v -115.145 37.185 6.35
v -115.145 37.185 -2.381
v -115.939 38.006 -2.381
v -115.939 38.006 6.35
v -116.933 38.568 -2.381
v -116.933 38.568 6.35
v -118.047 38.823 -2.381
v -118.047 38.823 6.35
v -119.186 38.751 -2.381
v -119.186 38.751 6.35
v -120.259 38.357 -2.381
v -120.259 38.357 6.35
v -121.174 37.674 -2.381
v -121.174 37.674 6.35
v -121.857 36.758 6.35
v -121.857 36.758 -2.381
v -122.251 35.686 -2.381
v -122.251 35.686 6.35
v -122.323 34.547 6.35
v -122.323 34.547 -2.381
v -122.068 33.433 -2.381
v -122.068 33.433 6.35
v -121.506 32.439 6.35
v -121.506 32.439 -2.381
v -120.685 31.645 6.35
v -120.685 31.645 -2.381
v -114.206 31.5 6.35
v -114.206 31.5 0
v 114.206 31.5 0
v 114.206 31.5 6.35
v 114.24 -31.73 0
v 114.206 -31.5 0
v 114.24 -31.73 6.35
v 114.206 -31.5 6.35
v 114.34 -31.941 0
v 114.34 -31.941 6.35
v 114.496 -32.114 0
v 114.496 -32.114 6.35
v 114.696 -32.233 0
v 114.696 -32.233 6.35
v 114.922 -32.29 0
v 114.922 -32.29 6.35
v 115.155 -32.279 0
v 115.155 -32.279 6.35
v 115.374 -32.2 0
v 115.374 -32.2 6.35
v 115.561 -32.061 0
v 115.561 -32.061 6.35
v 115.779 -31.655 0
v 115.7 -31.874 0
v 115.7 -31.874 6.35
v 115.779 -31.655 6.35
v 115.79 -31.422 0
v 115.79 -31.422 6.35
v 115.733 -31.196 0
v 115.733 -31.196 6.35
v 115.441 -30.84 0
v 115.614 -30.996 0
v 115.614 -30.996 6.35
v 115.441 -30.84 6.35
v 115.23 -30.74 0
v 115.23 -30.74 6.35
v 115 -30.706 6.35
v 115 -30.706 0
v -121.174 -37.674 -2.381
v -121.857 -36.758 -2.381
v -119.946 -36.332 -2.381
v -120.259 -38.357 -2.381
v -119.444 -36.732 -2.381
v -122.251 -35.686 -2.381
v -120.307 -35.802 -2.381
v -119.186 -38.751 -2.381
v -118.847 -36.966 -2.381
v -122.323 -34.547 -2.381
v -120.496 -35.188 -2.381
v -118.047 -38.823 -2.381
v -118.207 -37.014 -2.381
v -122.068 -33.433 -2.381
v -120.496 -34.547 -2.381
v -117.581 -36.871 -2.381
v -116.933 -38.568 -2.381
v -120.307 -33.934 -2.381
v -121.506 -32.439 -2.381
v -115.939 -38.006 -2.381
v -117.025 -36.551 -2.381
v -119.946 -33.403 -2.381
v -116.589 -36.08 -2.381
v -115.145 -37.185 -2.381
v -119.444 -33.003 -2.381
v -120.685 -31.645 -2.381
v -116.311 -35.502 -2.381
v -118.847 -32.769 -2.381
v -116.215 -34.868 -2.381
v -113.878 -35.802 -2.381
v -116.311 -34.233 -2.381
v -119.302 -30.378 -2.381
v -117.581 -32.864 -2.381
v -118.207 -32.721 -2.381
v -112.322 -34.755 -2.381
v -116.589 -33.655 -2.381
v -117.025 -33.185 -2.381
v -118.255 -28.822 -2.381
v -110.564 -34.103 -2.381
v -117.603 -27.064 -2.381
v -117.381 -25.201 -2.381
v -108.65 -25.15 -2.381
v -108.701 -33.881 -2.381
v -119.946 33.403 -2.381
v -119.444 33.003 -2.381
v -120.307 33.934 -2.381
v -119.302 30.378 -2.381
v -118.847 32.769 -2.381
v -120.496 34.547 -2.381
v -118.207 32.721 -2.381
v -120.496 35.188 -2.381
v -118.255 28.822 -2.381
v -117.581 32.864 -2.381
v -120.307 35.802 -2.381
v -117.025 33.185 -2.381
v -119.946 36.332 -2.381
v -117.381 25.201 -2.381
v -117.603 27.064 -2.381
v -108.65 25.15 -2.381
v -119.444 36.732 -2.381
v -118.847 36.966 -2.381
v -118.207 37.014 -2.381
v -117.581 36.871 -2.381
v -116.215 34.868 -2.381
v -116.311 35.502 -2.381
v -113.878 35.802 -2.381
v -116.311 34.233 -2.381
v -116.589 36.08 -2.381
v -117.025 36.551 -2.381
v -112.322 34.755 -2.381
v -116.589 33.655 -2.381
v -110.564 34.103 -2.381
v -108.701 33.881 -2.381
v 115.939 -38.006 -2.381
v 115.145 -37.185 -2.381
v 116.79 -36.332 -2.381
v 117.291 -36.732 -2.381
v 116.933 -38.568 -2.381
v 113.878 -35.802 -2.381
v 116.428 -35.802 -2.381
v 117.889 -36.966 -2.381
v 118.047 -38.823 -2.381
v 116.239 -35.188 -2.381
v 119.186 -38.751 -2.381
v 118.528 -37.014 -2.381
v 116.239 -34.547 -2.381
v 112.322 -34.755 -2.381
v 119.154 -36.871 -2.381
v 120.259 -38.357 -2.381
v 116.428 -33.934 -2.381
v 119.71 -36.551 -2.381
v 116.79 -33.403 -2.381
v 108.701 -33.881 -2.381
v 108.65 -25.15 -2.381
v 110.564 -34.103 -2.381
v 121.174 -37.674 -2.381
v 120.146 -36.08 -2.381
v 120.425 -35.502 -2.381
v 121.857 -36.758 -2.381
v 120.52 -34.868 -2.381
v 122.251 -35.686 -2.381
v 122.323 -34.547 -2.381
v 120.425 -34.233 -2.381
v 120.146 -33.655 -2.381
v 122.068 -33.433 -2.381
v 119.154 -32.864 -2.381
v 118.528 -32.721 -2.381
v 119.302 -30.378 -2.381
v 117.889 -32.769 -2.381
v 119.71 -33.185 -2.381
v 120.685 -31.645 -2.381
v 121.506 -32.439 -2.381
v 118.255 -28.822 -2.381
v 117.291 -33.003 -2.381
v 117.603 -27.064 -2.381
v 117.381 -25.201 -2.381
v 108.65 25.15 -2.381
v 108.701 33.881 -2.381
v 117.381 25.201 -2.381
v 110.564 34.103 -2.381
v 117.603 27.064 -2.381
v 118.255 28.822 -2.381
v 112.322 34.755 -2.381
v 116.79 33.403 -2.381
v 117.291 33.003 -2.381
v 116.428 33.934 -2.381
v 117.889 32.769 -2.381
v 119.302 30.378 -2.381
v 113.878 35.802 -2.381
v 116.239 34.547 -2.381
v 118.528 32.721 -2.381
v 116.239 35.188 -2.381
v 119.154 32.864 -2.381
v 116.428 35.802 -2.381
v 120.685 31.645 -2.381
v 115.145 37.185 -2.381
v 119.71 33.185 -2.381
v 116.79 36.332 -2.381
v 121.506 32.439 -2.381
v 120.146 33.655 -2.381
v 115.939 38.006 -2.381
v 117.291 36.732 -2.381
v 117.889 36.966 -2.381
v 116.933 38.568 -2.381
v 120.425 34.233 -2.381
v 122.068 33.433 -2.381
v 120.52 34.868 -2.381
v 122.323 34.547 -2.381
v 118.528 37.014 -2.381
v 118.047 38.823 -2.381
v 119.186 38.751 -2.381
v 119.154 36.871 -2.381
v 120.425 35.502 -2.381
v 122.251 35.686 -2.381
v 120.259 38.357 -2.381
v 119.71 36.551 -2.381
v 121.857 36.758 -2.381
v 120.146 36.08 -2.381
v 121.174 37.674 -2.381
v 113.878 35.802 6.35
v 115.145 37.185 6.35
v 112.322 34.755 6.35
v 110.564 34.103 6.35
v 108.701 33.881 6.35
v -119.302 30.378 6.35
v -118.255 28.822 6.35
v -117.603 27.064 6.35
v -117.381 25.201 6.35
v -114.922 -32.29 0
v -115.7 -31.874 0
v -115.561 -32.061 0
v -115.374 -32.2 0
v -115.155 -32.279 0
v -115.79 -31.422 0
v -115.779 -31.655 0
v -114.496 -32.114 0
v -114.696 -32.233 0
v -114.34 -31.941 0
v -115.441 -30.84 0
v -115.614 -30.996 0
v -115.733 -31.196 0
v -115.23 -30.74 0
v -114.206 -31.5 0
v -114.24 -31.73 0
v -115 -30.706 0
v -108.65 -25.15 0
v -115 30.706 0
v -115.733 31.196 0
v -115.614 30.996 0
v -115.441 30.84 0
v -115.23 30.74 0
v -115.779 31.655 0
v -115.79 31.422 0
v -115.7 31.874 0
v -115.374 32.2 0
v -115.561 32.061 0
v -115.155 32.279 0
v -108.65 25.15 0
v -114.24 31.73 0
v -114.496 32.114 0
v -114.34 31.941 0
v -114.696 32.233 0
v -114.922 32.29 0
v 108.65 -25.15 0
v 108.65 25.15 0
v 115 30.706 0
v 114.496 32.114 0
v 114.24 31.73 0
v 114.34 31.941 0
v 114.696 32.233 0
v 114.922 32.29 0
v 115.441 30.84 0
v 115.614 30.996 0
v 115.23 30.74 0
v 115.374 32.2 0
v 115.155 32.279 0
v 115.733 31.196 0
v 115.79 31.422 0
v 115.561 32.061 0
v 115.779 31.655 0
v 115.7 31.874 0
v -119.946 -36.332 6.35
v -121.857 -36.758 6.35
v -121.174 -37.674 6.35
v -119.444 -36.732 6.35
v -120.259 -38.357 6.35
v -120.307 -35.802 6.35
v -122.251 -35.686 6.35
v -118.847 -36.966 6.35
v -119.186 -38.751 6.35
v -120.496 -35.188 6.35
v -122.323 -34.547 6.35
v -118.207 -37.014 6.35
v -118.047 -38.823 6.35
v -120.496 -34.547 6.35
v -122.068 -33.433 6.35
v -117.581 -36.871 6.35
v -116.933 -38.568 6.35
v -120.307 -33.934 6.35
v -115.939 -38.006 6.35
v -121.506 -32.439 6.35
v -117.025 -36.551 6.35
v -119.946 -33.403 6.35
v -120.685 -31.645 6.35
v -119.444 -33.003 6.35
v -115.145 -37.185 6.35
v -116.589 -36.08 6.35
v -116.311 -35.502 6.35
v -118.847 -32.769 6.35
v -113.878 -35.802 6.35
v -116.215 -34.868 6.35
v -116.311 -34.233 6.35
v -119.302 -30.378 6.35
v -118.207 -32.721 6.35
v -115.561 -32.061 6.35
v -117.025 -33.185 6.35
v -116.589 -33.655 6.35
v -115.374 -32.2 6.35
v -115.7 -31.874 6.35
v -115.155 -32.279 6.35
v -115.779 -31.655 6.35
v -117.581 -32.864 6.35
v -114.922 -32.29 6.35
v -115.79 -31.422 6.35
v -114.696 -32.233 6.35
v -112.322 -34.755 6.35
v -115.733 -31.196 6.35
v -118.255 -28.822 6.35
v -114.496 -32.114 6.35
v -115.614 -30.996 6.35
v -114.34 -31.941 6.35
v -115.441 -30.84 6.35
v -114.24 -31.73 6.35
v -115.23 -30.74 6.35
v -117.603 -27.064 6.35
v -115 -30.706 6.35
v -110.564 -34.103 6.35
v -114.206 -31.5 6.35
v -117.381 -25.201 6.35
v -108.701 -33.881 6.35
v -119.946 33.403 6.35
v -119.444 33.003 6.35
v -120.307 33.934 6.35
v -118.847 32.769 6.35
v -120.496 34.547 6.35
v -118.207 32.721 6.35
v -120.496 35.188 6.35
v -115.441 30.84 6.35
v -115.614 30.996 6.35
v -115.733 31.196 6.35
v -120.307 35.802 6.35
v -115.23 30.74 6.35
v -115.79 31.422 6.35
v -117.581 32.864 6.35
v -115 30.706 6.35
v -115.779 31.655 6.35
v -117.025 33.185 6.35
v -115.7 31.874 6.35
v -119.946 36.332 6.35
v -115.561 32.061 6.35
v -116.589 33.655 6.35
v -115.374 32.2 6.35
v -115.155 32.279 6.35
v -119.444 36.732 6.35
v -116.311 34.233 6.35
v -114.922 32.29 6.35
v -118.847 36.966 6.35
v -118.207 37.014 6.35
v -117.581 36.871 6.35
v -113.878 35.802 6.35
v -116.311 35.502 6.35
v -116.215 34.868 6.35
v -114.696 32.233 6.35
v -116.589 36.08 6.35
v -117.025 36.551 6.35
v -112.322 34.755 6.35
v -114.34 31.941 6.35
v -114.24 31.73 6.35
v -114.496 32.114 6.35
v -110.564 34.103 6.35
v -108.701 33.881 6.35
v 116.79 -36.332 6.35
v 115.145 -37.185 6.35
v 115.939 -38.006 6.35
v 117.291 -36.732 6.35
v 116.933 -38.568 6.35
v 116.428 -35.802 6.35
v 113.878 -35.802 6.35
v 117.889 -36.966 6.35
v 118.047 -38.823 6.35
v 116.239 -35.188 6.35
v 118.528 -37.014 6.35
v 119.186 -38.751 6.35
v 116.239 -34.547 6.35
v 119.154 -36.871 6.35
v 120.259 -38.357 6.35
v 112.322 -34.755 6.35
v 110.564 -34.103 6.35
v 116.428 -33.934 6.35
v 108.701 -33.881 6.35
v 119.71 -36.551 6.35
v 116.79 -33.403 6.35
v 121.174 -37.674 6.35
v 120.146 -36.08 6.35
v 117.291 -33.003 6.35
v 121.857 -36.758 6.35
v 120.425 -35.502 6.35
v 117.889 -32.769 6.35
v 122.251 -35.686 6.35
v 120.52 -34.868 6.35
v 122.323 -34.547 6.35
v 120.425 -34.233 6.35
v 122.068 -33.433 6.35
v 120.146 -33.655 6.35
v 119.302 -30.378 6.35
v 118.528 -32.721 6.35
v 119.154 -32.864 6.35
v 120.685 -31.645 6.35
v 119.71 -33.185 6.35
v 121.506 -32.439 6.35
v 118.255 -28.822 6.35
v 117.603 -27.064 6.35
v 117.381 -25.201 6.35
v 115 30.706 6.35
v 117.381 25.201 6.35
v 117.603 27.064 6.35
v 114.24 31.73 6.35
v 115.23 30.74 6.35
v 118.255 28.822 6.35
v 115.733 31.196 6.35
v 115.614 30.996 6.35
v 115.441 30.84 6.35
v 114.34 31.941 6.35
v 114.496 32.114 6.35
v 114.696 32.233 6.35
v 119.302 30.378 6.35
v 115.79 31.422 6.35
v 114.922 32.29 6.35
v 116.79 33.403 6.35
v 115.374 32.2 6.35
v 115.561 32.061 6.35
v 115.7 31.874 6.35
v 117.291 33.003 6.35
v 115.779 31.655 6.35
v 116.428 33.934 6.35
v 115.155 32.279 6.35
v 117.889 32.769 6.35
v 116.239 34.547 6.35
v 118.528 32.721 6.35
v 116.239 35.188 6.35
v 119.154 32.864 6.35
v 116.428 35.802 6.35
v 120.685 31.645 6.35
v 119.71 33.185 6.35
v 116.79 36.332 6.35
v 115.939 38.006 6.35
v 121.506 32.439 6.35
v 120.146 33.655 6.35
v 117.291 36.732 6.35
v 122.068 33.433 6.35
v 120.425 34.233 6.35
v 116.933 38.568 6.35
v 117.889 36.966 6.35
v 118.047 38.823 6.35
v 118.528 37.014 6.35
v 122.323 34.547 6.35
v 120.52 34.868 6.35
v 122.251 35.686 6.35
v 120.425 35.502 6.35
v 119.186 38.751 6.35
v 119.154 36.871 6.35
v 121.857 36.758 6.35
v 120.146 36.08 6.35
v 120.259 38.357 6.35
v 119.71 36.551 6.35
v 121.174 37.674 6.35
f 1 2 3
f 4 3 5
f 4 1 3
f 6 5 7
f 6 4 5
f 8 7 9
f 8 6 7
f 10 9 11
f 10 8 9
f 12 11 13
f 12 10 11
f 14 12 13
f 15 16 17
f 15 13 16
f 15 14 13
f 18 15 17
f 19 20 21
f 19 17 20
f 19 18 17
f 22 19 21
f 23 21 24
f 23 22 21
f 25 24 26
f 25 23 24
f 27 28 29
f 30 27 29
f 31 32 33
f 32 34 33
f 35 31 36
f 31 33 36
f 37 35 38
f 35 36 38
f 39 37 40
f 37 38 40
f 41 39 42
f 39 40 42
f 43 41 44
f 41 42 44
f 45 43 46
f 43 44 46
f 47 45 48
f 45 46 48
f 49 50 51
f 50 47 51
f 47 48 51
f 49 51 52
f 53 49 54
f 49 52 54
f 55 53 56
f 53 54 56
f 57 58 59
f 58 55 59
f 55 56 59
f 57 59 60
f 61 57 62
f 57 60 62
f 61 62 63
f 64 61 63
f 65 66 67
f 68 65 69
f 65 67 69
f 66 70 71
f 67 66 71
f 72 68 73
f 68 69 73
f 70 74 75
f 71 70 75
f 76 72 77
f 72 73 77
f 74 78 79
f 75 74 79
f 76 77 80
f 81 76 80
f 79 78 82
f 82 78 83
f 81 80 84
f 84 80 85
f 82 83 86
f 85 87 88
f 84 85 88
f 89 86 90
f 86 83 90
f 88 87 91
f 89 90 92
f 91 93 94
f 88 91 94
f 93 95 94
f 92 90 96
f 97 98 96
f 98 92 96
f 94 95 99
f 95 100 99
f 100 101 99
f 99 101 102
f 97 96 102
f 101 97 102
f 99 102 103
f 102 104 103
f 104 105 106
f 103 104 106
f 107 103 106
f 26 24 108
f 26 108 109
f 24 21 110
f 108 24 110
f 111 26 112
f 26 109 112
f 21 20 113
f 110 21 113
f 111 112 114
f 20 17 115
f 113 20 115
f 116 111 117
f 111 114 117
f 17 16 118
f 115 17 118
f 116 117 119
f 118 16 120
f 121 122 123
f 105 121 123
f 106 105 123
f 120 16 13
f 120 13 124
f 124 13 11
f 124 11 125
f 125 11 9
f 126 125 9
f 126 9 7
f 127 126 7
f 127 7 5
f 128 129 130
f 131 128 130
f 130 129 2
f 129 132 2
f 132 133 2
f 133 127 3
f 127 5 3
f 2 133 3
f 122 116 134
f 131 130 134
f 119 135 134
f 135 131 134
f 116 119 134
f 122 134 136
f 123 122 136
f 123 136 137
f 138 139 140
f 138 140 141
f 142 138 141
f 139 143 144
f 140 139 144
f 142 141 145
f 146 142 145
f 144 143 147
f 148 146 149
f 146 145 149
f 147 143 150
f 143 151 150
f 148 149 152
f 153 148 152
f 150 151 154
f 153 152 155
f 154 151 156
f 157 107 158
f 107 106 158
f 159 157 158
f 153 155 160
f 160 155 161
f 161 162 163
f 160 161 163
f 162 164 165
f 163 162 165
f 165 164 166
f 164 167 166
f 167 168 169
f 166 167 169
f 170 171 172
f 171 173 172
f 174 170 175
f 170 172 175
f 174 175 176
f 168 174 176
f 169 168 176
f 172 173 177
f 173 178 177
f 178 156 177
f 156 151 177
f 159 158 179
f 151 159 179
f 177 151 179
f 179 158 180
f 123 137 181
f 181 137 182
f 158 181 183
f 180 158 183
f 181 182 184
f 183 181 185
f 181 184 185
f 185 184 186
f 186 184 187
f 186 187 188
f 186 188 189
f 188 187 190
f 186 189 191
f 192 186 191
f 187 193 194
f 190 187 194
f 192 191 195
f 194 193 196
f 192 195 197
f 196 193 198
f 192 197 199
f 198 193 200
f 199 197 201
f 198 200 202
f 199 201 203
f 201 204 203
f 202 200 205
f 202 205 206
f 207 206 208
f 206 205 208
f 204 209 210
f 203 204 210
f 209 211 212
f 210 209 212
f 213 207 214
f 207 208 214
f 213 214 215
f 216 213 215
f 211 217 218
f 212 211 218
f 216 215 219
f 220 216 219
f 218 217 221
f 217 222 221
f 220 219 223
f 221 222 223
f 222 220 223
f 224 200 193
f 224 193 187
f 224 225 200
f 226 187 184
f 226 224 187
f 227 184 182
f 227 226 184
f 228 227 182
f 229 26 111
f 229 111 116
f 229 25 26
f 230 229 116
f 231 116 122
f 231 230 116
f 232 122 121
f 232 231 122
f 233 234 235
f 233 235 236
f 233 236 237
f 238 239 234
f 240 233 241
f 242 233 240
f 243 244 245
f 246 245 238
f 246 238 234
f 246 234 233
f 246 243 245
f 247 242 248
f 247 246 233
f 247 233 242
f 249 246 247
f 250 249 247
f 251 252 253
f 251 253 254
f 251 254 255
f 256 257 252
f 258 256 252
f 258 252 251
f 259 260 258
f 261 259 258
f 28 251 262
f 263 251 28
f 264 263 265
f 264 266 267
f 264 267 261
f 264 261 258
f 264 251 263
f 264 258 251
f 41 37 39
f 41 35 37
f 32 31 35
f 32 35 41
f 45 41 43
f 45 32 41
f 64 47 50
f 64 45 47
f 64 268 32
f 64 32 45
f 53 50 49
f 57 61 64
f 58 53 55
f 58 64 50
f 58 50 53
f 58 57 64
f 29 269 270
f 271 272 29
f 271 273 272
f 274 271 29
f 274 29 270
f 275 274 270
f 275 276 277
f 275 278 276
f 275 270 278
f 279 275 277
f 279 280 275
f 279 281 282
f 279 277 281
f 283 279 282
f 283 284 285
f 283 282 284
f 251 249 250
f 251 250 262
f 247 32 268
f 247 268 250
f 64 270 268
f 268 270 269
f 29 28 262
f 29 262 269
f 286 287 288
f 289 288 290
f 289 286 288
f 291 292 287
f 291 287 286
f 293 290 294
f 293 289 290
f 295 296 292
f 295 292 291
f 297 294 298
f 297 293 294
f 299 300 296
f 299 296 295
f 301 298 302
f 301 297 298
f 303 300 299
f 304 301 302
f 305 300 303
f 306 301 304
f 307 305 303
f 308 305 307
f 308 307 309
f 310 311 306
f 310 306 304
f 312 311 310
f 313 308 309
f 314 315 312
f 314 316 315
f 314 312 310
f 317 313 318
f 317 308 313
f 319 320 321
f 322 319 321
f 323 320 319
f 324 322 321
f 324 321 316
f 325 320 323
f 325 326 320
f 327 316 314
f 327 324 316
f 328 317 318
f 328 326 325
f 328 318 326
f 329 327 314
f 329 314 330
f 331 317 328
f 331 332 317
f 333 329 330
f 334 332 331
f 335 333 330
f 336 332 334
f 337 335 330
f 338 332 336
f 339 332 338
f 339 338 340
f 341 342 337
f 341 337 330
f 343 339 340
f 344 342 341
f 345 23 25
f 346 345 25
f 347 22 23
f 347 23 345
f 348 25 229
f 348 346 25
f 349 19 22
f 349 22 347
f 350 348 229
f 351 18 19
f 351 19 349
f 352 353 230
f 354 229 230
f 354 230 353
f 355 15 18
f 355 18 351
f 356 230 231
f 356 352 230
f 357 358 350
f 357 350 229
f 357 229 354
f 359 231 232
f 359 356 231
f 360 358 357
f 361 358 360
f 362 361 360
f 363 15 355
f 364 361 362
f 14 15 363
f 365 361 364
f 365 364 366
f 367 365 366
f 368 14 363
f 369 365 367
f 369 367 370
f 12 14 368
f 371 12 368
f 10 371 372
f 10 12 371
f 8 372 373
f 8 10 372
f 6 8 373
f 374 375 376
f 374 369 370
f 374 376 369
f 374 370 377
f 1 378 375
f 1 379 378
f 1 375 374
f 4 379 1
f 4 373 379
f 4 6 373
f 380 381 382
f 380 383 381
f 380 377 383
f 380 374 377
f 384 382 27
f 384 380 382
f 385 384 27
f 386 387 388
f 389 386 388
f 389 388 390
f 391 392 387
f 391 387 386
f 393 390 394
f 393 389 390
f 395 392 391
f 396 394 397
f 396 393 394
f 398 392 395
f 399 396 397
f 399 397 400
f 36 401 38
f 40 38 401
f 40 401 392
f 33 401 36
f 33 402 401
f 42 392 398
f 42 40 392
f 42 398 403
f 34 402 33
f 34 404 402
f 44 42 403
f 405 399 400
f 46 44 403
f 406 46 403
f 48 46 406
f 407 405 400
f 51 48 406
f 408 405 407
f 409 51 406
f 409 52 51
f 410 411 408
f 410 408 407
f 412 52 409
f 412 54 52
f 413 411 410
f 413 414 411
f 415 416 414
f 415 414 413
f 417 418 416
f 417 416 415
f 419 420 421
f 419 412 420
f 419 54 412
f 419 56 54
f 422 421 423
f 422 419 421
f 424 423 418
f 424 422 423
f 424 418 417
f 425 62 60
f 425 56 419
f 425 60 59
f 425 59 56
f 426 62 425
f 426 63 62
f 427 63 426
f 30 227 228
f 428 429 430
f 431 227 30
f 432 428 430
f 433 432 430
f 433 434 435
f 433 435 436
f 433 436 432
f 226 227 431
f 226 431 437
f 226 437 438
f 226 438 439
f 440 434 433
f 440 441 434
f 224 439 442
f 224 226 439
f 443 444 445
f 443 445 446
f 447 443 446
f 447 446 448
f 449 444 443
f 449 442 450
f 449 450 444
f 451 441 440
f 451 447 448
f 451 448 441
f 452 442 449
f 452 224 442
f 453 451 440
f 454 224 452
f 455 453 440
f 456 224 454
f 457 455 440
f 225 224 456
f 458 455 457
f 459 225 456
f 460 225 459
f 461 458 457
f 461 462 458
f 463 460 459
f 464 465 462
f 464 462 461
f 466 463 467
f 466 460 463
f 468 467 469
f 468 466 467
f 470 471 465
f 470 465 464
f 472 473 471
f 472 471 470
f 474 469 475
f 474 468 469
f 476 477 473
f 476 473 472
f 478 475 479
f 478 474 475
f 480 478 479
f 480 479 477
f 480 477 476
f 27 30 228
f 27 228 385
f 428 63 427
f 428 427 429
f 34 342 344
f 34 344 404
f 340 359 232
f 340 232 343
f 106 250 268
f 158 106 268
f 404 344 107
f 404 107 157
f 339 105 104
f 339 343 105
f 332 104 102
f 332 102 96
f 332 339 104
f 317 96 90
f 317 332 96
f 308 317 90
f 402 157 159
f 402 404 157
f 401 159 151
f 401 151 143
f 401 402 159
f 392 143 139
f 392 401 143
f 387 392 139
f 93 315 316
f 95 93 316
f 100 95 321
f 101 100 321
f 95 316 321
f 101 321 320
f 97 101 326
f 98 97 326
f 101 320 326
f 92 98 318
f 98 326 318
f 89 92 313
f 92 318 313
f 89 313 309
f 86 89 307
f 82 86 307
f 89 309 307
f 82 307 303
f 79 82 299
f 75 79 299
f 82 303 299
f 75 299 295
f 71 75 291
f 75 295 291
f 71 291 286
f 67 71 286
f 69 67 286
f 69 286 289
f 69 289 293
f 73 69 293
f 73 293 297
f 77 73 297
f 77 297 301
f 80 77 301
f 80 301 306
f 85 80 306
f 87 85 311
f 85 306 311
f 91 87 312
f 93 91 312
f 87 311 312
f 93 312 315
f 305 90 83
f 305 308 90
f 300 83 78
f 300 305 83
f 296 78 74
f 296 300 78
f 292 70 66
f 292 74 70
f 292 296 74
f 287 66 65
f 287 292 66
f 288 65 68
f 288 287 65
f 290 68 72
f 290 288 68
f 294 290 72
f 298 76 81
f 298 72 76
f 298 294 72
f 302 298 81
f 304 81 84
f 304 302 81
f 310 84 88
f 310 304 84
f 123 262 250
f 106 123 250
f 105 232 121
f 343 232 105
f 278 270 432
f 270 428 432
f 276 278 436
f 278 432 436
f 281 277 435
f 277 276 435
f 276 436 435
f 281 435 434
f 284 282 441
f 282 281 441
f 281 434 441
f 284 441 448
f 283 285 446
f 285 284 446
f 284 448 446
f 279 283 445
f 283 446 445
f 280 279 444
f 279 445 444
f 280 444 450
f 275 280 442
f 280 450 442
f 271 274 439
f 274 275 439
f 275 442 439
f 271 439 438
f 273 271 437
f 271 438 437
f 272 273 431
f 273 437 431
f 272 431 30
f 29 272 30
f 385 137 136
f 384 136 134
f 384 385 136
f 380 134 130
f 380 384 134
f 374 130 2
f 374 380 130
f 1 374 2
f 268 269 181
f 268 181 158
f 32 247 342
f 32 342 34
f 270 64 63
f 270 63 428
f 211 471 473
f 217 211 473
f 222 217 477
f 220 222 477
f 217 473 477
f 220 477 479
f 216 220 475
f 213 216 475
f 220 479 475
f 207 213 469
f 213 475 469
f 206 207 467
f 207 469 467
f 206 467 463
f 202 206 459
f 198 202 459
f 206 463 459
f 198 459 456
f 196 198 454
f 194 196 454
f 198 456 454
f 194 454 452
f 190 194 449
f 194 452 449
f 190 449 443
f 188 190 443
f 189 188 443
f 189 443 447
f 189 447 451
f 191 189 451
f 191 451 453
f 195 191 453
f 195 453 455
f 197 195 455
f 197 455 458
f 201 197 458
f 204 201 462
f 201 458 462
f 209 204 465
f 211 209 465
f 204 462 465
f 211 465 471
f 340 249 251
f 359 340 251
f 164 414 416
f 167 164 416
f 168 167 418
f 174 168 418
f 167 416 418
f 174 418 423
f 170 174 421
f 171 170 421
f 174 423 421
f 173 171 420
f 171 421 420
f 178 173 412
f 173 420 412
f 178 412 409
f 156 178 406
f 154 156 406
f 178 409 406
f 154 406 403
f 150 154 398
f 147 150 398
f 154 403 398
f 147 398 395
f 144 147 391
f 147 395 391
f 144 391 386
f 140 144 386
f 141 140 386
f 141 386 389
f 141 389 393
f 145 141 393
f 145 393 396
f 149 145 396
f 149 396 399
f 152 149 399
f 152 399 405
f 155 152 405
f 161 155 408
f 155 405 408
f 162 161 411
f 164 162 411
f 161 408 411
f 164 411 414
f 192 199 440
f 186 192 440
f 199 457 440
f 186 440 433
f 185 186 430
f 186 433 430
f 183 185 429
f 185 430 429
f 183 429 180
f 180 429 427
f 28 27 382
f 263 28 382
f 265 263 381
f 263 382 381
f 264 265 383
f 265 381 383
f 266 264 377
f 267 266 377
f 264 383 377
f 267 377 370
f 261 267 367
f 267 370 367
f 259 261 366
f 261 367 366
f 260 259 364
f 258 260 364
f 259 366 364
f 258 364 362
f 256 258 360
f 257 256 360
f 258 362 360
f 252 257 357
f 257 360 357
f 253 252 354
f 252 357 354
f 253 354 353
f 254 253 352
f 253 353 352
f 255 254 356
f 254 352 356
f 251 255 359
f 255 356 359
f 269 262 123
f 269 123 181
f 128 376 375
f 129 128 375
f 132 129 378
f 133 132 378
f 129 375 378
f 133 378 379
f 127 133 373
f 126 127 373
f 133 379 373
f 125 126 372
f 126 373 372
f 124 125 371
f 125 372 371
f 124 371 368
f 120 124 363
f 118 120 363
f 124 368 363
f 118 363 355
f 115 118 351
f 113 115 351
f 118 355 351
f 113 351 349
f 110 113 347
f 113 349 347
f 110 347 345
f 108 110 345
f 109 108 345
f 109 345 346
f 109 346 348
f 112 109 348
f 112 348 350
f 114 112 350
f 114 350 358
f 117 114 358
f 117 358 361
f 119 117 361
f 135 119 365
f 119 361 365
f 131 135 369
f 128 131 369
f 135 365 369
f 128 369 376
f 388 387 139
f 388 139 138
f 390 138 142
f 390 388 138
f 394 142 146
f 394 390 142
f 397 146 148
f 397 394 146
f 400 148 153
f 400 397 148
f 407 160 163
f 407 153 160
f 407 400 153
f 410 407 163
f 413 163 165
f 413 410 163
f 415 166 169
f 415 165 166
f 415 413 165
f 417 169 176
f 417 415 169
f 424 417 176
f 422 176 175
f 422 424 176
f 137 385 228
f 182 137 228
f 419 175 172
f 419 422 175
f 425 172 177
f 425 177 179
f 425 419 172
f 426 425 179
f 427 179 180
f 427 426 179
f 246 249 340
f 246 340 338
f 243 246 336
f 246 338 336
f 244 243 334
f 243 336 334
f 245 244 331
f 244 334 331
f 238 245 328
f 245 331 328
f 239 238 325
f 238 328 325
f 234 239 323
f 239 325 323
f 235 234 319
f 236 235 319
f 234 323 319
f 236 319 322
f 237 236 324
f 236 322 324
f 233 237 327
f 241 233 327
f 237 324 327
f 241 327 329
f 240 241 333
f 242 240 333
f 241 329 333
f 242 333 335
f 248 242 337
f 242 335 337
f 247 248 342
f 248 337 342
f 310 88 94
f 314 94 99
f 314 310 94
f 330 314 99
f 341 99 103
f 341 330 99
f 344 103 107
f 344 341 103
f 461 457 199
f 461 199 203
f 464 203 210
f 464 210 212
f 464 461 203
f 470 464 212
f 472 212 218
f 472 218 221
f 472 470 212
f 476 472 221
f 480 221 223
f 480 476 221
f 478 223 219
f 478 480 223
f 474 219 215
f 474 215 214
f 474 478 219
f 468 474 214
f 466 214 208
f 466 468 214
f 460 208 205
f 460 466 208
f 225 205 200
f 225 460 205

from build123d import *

# Parameters (mm, degrees)
F0_W      = 234.762548
F0_H      = 67.762526
F0_W_2    = 230.000048
F0_H_2    = 63.000026
F1_DEPTH  = 6.35
F2_W      = 234.762548
F2_H      = 67.762526
F2_W_2    = 217.300048
F2_H_2    = 50.300026
F3_DEPTH  = 2.38125
F4_R      = 3.96875
F5_DEPTH  = 8.73125
F6_R      = 7.9375
F7_R      = 2.15265
F8_DEPTH  = 8.73125
F9_R      = 0.79375
F10_DEPTH = 6.35


with BuildPart() as f1:
    # F0 (on Top) → F1 (new body)
    with BuildSketch(Plane.XY):
        Rectangle(F0_W, F0_H)
        Rectangle(F0_W_2, F0_H_2, mode=Mode.SUBTRACT)
    extrude(amount=F1_DEPTH)

    # F2 (on face) → F3 (join)
    with BuildSketch(Plane(origin=(0, 0, 0), x_dir=(1, 0, 0), z_dir=(0, 0, -1))):
        Rectangle(F2_W, F2_H)
        Rectangle(F2_W_2, F2_H_2, mode=Mode.SUBTRACT)
    extrude(amount=F3_DEPTH)

    # F4 (on face) → F5 (join, through all)
    with BuildSketch(Plane.XY.offset(6.35)):
        with Locations((118.36762, 34.867609)):
            Circle(F4_R)
        with Locations((118.36762, -34.867609)):
            Circle(F4_R)
        with Locations((-118.36762, -34.867609)):
            Circle(F4_R)
        with Locations((-118.36762, 34.867609)):
            Circle(F4_R)
    extrude(amount=-F5_DEPTH)

    # F6
    f6_edges = [f1.edges().sort_by_distance(p)[0] for p in [
        (114.523391, 33.881263, 1.984375),
        (117.381274, 31.02338, 1.984375),
        (117.381274, -31.02338, 1.984375),
        (114.523391, -33.881263, 1.984375),
        (-117.381274, -31.02338, 1.984375),
        (-114.523391, -33.881263, 1.984375),
        (-114.523391, 33.881263, 1.984375),
        (-117.381274, 31.02338, 1.984375),
    ]]
    fillet(f6_edges, radius=F6_R)

    # F7 (on face) → F8 (cut, through all)
    with BuildSketch(Plane.XY.offset(6.35)):
        with Locations((118.36762, 34.867609)):
            Circle(F7_R)
        with Locations((118.36762, -34.867609)):
            Circle(F7_R)
        with Locations((-118.36762, 34.867609)):
            Circle(F7_R)
        with Locations((-118.36762, -34.867609)):
            Circle(F7_R)
    extrude(amount=-F8_DEPTH, mode=Mode.SUBTRACT)

    # F9 (on face) → F10 (cut, through all)
    with BuildSketch(Plane.XY.offset(6.35)):
        with Locations((-115.000024, 31.500013)):
            Circle(F9_R)
        with Locations((-115.000024, -31.500013)):
            Circle(F9_R)
        with Locations((115.000024, -31.500013)):
            Circle(F9_R)
        with Locations((115.000024, 31.500013)):
            Circle(F9_R)
    extrude(amount=-F10_DEPTH, mode=Mode.SUBTRACT)


solid = f1.part
